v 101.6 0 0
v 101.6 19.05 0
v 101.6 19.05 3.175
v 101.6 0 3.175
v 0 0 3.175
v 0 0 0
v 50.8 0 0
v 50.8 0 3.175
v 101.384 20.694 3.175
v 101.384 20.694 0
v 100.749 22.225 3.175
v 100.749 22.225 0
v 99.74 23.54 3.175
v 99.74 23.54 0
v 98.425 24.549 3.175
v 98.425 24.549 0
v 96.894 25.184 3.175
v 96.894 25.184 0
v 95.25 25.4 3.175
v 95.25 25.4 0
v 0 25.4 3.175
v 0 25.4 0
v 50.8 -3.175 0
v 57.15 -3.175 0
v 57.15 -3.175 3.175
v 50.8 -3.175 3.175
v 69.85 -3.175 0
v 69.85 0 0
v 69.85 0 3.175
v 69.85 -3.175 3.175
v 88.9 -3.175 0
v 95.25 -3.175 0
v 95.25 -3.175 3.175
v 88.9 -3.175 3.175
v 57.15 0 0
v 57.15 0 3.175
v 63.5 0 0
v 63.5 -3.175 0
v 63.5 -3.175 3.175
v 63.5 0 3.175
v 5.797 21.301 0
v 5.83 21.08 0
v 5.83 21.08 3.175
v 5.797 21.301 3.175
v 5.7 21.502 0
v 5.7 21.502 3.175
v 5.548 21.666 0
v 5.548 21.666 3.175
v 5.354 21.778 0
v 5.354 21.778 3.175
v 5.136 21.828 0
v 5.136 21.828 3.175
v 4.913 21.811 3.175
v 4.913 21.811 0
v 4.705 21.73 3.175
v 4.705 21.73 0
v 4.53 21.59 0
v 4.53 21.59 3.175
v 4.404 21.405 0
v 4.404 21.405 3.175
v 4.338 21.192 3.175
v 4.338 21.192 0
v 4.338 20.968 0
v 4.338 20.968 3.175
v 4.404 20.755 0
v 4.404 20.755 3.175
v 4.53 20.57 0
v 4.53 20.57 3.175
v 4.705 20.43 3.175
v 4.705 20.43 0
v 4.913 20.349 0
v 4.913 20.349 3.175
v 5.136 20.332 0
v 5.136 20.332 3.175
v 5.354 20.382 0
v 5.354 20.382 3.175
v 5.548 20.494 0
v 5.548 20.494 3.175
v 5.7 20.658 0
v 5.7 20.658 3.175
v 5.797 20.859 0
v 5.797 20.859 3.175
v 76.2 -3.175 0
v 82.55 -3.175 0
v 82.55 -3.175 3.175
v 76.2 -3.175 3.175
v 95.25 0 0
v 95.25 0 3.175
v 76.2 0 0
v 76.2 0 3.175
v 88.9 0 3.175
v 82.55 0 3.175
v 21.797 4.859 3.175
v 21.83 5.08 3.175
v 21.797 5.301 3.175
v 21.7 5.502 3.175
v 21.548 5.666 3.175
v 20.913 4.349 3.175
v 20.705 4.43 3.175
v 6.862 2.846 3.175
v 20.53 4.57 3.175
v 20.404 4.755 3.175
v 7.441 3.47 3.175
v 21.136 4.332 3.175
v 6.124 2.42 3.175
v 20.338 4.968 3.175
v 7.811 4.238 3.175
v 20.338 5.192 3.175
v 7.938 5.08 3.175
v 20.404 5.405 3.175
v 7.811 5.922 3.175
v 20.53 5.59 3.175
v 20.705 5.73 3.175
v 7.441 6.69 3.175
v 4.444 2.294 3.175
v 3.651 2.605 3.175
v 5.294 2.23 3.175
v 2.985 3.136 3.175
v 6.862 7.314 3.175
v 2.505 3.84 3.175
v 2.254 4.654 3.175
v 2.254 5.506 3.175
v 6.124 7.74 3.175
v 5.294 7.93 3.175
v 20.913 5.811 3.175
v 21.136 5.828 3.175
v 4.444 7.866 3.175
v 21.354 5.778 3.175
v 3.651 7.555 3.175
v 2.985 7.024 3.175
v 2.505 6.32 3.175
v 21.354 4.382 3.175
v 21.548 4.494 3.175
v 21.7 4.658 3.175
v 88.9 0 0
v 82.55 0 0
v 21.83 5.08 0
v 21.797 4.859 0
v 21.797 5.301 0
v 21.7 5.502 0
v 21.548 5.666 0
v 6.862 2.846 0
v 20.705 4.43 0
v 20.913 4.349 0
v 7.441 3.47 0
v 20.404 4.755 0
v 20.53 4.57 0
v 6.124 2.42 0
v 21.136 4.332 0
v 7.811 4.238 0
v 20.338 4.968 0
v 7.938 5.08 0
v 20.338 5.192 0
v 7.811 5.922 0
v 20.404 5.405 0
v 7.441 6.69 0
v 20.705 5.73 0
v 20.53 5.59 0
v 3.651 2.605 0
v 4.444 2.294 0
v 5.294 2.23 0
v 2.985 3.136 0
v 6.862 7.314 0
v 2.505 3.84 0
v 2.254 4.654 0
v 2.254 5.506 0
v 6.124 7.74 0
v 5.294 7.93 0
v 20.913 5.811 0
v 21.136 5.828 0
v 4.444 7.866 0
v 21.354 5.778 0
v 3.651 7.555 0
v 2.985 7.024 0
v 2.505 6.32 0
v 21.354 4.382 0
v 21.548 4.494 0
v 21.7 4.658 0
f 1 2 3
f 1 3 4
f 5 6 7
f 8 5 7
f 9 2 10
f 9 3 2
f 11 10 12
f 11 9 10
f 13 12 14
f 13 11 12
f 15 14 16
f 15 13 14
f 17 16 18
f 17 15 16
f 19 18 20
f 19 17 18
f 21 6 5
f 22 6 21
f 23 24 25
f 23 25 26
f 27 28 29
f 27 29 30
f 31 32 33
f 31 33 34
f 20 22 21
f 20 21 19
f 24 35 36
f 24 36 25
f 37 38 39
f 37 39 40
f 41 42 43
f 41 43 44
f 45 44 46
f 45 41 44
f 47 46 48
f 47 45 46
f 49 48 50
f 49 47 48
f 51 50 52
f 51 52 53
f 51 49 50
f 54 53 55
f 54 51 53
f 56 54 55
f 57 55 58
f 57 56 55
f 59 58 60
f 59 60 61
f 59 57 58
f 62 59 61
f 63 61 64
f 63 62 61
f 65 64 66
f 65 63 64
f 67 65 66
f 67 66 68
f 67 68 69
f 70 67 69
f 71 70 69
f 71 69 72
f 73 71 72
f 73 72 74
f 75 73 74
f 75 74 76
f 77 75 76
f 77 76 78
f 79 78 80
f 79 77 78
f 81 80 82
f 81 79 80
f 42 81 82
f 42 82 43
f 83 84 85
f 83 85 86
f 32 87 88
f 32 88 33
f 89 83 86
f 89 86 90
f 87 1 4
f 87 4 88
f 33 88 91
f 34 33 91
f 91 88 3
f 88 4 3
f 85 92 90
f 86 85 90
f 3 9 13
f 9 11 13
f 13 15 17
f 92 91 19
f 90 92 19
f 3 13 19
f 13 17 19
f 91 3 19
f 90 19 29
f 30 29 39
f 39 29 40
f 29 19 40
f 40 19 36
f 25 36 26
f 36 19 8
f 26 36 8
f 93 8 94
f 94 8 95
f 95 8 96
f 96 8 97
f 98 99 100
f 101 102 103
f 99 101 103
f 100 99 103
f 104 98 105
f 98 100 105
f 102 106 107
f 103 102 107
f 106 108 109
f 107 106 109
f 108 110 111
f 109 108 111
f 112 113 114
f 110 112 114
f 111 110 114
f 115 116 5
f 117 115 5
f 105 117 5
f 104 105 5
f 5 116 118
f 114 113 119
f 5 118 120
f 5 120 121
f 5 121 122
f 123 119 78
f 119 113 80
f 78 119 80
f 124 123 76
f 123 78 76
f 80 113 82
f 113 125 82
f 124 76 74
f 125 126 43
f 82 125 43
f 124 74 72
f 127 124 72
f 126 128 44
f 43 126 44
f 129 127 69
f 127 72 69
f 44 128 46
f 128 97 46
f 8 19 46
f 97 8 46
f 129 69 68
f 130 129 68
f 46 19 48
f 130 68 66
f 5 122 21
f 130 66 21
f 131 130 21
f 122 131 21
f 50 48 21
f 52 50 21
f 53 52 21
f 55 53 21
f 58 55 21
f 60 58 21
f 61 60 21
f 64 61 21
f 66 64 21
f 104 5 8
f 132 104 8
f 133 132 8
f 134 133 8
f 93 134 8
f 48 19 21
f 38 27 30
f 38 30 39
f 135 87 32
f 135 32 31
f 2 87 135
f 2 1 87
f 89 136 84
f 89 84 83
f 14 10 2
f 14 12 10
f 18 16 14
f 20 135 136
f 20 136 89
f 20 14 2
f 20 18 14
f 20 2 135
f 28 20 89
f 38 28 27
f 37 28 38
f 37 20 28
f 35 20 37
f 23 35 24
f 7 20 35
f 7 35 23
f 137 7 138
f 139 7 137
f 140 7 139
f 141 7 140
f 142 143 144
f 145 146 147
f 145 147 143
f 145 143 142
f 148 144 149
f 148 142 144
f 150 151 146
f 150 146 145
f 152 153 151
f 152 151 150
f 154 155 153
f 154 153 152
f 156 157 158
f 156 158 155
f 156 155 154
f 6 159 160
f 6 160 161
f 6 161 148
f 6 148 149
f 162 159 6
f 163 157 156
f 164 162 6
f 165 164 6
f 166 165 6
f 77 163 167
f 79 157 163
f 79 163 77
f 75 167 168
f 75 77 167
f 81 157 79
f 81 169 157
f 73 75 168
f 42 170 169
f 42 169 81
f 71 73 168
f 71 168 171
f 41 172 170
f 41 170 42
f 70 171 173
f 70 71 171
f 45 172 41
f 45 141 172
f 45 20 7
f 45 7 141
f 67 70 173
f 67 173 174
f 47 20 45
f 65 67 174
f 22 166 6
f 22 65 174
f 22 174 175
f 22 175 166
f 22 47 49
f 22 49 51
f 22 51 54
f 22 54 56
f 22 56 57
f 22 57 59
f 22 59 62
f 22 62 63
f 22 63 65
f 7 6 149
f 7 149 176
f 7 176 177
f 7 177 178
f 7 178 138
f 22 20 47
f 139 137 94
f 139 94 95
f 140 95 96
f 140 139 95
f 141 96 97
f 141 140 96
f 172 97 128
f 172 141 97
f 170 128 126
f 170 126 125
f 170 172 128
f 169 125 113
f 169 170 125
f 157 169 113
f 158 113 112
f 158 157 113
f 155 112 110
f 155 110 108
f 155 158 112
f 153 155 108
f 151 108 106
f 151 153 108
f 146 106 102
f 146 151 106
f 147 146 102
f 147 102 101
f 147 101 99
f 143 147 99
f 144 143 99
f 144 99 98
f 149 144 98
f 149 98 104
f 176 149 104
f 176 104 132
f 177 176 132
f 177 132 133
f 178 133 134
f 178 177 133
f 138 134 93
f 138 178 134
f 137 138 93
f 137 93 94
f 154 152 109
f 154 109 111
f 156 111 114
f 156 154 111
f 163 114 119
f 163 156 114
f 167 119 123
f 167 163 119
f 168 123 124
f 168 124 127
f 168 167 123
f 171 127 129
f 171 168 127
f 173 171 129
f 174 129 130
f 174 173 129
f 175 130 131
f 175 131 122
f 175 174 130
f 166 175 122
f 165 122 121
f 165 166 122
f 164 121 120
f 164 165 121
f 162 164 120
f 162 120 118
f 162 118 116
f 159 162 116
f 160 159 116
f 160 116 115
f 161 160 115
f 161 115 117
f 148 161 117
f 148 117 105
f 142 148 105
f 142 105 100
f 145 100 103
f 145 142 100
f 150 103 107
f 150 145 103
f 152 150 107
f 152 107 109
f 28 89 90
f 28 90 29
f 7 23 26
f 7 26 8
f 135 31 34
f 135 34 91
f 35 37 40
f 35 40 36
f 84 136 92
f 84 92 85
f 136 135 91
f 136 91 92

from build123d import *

# Parameters (mm, degrees)
SKETCH1_R           = 2.8575
SKETCH1_R_2         = 0.75
BOSS_EXTRUDE1_DEPTH = 3.175
FILLET1_R           = 6.35


with BuildPart() as part:
    # Sketch1 → Boss-Extrude1 (new body)
    with BuildSketch(Plane.XY):
        Polygon((95.25, 0), (95.25, -3.175), (88.9, -3.175), (88.9, 0), (82.55, 0), (82.55, -3.175), (76.2, -3.175), (76.2, 0), (69.85, 0), (69.85, -3.175), (63.5, -3.175), (63.5, 0), (57.15, 0), (57.15, -3.175), (50.8, -3.175), (50.8, 0), (44.45, 0), (0, 0), (0, 25.4), (101.6, 25.4), (101.6, 0), align=None)
        with Locations((5.08, 5.08)):
            Circle(SKETCH1_R, mode=Mode.SUBTRACT)
        with Locations((5.08, 21.08)):
            Circle(SKETCH1_R_2, mode=Mode.SUBTRACT)
        with Locations((21.08, 5.08)):
            Circle(SKETCH1_R_2, mode=Mode.SUBTRACT)
    extrude(amount=BOSS_EXTRUDE1_DEPTH)

    # Fillet1
    fillet1_edges = [part.edges().sort_by_distance(p)[0] for p in [
        (101.6, 25.4, 1.5875),
    ]]
    fillet(fillet1_edges, radius=FILLET1_R)


solid = part.part
